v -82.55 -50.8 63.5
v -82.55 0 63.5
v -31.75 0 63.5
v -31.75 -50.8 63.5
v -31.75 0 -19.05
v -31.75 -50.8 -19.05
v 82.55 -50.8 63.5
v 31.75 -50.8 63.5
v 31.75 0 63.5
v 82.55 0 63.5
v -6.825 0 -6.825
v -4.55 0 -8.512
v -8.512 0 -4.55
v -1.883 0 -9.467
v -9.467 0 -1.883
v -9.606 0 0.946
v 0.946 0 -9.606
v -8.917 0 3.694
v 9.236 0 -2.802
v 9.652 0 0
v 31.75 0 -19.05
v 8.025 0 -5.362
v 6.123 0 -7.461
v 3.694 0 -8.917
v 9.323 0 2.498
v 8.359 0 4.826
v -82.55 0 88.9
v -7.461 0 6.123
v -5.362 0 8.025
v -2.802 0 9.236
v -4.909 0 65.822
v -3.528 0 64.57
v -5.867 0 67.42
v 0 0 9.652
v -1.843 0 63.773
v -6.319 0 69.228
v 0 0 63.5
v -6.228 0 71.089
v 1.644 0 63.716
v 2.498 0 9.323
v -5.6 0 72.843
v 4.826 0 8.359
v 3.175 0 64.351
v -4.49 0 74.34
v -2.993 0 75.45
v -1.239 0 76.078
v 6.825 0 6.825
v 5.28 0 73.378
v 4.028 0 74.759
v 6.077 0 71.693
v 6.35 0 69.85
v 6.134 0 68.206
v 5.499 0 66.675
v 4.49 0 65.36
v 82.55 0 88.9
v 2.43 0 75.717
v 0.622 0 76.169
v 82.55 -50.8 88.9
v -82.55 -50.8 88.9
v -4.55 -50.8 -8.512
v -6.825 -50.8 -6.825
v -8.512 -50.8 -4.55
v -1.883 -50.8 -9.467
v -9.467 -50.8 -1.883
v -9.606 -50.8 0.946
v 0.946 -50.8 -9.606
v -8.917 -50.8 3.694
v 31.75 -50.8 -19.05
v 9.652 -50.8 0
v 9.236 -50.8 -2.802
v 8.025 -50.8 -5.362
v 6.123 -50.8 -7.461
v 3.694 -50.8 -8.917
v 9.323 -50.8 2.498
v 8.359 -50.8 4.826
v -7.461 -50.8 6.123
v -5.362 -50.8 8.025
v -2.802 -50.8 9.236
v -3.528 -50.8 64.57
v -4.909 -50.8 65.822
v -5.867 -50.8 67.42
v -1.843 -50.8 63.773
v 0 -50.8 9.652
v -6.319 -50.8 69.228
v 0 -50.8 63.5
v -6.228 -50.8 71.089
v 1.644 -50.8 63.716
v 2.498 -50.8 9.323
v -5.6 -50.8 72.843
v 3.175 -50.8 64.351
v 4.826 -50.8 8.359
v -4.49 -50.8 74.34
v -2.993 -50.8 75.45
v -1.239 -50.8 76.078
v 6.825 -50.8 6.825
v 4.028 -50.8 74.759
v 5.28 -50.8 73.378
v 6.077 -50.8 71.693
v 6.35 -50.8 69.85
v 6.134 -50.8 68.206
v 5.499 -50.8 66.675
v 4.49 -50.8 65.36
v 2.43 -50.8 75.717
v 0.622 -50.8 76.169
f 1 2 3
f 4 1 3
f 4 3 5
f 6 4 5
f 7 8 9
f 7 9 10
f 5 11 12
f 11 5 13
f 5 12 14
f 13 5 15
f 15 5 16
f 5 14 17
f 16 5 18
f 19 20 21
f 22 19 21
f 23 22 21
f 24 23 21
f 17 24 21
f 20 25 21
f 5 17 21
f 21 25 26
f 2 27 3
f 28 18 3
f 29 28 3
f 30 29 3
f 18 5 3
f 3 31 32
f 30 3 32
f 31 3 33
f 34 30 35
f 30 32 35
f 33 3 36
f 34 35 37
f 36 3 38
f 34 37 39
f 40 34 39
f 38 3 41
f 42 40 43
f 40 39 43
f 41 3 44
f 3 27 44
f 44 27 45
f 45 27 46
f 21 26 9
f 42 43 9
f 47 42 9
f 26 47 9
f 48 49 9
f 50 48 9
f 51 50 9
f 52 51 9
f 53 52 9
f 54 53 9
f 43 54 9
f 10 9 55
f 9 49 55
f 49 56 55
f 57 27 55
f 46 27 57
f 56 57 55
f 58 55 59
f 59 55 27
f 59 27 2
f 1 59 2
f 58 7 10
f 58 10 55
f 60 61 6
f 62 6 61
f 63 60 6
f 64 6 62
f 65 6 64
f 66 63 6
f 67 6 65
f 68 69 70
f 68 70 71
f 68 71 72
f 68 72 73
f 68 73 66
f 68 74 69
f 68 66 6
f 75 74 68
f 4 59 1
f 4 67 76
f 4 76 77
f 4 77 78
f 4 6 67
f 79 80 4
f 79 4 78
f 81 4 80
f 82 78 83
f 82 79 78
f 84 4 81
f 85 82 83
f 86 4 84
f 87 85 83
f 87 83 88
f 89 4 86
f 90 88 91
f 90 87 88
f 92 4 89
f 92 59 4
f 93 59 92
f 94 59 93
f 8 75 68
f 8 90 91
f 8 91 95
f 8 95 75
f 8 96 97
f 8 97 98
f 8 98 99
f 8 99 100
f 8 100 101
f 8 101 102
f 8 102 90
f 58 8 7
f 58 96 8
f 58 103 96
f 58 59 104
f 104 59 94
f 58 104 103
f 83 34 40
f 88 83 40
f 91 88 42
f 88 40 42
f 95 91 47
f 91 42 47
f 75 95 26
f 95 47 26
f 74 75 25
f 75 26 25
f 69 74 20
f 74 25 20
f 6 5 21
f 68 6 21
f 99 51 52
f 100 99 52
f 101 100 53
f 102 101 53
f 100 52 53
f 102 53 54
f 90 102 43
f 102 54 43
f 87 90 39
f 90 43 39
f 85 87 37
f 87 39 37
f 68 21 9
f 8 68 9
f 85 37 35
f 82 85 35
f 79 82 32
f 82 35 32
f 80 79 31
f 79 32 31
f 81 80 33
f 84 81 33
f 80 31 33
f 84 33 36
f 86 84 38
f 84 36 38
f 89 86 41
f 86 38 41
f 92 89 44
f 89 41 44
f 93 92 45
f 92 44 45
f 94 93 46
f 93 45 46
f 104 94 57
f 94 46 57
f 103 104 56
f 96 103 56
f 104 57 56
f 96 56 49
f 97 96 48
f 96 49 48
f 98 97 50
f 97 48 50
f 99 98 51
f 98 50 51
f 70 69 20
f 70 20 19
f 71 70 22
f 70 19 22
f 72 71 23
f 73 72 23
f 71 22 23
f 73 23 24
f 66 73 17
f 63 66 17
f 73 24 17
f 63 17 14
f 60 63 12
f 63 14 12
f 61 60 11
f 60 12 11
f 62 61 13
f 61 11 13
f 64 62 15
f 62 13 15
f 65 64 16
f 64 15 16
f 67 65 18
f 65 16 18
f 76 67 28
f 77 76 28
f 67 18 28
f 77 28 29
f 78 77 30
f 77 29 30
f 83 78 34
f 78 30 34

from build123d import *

# Parameters (mm, degrees)
F1_DEPTH = 50.8


with BuildPart() as f1:
    # F0 (on Front) → F1 (new body)
    with BuildSketch(Plane.XZ):
        Polygon((-31.75, -19.05), (0, -19.05), (31.75, -19.05), (31.75, 63.5), (82.55, 63.5), (82.55, 88.9), (-82.55, 88.9), (-82.55, 63.5), (-31.75, 63.5), align=None)
        with BuildLine():
            ThreePointArc((0, 9.652), (6.824994652, 6.824994652), (9.652, 0))
            ThreePointArc((9.652, 0), (-6.824994652, -6.824994652), (0, 9.652))
        make_face(mode=Mode.SUBTRACT)
        with BuildLine():
            ThreePointArc((6.35, 69.85), (4.4901280605, 65.3598719395), (0, 63.5))
            ThreePointArc((0, 63.5), (-4.4901280605, 74.3401280605), (6.35, 69.85))
        make_face(mode=Mode.SUBTRACT)
    extrude(amount=F1_DEPTH)


solid = f1.part
